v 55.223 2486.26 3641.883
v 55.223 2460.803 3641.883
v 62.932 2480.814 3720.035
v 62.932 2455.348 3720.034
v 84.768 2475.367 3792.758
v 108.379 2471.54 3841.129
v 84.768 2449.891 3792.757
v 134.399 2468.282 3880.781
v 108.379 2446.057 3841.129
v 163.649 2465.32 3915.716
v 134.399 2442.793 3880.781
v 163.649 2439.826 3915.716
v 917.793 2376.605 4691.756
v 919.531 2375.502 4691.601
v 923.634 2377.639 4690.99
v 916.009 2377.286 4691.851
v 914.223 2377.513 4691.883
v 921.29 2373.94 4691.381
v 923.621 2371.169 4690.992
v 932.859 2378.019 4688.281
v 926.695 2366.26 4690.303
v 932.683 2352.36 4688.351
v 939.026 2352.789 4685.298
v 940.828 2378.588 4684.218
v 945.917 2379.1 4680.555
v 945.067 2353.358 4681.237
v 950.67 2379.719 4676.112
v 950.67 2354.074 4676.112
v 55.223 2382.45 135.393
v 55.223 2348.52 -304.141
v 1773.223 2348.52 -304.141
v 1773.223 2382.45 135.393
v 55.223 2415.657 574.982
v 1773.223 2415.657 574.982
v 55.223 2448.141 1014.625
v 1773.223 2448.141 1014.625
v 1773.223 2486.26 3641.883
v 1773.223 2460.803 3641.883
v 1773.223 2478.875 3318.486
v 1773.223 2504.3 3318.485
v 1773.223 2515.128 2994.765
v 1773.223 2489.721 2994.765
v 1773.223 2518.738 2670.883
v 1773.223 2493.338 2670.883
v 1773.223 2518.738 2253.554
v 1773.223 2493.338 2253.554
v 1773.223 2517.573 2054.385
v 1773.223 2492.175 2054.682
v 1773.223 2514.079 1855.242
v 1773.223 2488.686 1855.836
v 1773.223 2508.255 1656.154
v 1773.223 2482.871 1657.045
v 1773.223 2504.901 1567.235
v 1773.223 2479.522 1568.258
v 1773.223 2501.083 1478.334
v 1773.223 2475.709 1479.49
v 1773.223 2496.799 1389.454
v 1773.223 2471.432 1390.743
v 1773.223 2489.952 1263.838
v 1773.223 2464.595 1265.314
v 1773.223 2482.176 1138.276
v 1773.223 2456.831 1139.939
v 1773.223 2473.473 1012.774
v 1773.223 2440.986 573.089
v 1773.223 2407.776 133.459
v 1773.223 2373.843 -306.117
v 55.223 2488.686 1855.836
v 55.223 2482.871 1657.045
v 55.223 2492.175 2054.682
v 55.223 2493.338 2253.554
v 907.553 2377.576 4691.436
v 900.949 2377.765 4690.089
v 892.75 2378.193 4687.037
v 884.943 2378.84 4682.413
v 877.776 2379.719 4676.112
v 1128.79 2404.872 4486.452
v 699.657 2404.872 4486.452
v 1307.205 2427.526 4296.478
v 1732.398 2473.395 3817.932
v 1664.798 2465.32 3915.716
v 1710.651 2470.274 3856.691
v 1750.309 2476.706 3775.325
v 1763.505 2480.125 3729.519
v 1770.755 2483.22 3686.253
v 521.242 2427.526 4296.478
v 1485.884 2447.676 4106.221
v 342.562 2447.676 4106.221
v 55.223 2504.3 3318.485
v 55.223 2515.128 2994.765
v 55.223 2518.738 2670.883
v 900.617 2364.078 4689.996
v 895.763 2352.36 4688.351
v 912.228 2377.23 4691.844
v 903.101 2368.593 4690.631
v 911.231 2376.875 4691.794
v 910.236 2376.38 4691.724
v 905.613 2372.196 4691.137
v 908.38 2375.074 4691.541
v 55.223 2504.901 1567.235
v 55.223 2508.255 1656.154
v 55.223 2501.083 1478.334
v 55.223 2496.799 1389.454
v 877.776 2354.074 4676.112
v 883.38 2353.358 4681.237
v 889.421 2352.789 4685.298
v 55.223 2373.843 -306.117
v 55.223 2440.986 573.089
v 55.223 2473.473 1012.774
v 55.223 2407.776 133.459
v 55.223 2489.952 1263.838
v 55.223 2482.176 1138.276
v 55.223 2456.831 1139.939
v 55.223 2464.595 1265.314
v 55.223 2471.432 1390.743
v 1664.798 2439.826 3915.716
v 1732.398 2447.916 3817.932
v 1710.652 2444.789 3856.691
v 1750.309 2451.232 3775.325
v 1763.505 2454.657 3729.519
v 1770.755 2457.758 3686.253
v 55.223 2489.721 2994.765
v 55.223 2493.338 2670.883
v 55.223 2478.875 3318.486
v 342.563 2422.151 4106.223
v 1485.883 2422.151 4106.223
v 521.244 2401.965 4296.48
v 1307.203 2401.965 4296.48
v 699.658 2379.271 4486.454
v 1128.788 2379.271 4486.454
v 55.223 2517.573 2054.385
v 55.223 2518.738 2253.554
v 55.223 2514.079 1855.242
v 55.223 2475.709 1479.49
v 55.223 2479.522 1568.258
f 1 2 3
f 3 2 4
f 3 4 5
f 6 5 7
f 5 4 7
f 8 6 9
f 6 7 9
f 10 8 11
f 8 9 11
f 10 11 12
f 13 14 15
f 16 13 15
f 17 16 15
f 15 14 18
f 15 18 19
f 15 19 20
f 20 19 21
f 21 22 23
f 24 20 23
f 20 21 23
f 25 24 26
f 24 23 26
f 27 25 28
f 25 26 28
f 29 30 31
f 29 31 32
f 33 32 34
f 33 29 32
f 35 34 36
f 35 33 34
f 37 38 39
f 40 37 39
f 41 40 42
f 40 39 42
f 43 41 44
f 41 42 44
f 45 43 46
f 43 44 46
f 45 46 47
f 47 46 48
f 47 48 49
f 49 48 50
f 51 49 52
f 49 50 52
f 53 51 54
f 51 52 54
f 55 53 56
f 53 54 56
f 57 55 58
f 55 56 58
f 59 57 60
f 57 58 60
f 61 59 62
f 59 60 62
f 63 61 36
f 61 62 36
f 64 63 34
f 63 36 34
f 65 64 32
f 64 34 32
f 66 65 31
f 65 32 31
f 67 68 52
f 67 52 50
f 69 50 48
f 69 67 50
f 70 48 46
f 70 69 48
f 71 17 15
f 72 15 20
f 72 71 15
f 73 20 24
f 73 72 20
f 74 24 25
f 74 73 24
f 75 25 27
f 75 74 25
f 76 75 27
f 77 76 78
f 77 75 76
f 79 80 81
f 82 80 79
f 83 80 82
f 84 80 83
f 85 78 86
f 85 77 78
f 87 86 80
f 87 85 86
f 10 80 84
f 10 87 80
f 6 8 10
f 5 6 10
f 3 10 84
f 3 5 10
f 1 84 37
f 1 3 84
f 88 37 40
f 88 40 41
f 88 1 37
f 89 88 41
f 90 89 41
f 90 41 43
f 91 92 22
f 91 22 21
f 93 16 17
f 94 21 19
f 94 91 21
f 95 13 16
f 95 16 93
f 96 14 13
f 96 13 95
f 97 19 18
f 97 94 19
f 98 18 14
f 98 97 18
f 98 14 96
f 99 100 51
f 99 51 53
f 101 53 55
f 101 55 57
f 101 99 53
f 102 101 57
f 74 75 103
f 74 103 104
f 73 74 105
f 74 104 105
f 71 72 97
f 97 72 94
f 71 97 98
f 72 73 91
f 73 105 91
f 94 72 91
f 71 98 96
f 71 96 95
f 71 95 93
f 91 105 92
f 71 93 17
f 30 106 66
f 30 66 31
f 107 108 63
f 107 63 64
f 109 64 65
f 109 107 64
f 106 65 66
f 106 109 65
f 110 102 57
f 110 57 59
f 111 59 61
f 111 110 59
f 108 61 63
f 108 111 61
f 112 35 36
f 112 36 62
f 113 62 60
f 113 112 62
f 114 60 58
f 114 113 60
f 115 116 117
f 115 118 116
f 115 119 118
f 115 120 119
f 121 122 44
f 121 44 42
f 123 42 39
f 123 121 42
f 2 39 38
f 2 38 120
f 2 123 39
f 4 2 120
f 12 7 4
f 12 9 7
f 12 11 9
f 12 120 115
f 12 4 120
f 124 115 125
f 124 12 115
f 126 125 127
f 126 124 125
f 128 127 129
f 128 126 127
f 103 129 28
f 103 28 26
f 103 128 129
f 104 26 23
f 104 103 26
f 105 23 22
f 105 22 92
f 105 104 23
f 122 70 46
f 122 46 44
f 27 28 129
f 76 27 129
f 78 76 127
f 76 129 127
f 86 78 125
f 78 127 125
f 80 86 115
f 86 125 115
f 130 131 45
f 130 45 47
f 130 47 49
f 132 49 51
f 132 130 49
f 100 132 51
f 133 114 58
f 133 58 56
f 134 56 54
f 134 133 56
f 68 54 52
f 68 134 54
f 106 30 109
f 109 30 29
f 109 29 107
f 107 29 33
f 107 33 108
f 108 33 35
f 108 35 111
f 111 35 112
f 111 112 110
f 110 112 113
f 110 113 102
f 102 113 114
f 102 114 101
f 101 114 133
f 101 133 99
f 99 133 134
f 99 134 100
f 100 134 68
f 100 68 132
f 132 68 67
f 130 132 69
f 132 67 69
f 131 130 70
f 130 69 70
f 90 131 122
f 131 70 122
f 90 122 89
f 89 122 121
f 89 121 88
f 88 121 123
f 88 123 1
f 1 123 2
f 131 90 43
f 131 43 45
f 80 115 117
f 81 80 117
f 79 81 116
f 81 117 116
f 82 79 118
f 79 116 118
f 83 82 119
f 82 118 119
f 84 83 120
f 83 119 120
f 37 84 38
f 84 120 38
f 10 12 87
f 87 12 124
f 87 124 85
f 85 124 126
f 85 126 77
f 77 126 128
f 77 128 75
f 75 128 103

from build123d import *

# Parameters (mm, degrees)
BOSS_EXTRUDE1_DEPTH      = 1562
BOSS_EXTRUDE1_DEPTH_BACK = 176
SKETCH2_W                = 3363.575860712
SKETCH2_H                = 5970.454949978
CUT_EXTRUDE2_DEPTH       = 6472


with BuildPart() as part:
    # Sketch1 → Boss-Extrude1 (new, two sides: drawn at the far end of the back side and taken through both)
    with BuildSketch(Plane(origin=(221.223204368, 2174.889348435, 3089.353639068), x_dir=(0, 0, -1), z_dir=(1, 0, 0)).offset(-BOSS_EXTRUDE1_DEPTH_BACK)):
        with BuildLine():
            Line((418.470256952, 343.848259545), (835.79936838, 343.848259545))
            ThreePointArc((835.79936838, 343.848259545), (1134.545393582, 341.22748792), (1433.199462208, 333.365979742))
            ThreePointArc((1433.199462208, 333.365979742), (1566.571910766, 328.160677129), (1699.899462208, 321.910138249))
            ThreePointArc((1699.899462208, 321.910138249), (1888.304064269, 311.290467655), (2076.579417193, 298.58365992))
            ThreePointArc((2076.579417193, 298.58365992), (2736.086325953, 249.582434707), (3395.470256952, 198.953250272))
            Line((3395.470256952, 198.953250272), (3393.494444982, 173.63021398))
            ThreePointArc((3393.494444982, 173.63021398), (2734.173034363, 224.25459794), (2074.728657642, 273.251177036))
            ThreePointArc((2074.728657642, 273.251177036), (1886.73413806, 285.939031173), (1698.61056213, 296.542861364))
            ThreePointArc((1698.61056213, 296.542861364), (1565.481883357, 302.784076879), (1432.308374436, 307.981615212))
            ThreePointArc((1432.308374436, 307.981615212), (1134.099781114, 315.831397088), (835.79936838, 318.448259545))
            Line((835.79936838, 318.448259545), (418.470256952, 318.448259545))
            ThreePointArc((418.470256952, 318.448259545), (-592.723275589, 283.160995459), (-1598.997170307, 177.470882066))
            Line((-1598.997170307, 177.470882066), (-1602.529743048, 202.624031567))
            ThreePointArc((-1602.529743048, 202.624031567), (-594.493869087, 308.499207682), (418.470256952, 343.848259545))
        make_face()
    extrude(amount=BOSS_EXTRUDE1_DEPTH + BOSS_EXTRUDE1_DEPTH_BACK)

    # Sketch2 → Cut-Extrude2 (cut)
    with BuildSketch(Plane(origin=(0, 0, 0), x_dir=(1, 0, 0), z_dir=(0, 1, 0))):
        with Locations((788.511086427, -1905.513066648)):
            Rectangle(SKETCH2_W, SKETCH2_H)
        with BuildLine():
            Line((950.670011749, -4676.112466704), (1664.797663416, -3915.71605882))
            ThreePointArc((1664.797663416, -3915.71605882), (1745.130305415, -3789.142025972), (1773.223204368, -3641.883382116))
            Line((1773.223204368, -3641.883382116), (1773.223204368, 306.116617884))
            Line((1773.223204368, 306.116617884), (55.223204368, 306.116617884))
            Line((55.223204368, 306.116617884), (55.223204368, -3641.883382116))
            ThreePointArc((55.223204368, -3641.883382116), (83.31610332, -3789.142025972), (163.648745319, -3915.71605882))
            Line((163.648745319, -3915.71605882), (877.776396987, -4676.112466704))
            ThreePointArc((877.776396987, -4676.112466704), (914.223204368, -4691.883382116), (950.670011749, -4676.112466704))
        make_face(mode=Mode.SUBTRACT)
    extrude(amount=CUT_EXTRUDE2_DEPTH, mode=Mode.SUBTRACT)


solid = part.part
